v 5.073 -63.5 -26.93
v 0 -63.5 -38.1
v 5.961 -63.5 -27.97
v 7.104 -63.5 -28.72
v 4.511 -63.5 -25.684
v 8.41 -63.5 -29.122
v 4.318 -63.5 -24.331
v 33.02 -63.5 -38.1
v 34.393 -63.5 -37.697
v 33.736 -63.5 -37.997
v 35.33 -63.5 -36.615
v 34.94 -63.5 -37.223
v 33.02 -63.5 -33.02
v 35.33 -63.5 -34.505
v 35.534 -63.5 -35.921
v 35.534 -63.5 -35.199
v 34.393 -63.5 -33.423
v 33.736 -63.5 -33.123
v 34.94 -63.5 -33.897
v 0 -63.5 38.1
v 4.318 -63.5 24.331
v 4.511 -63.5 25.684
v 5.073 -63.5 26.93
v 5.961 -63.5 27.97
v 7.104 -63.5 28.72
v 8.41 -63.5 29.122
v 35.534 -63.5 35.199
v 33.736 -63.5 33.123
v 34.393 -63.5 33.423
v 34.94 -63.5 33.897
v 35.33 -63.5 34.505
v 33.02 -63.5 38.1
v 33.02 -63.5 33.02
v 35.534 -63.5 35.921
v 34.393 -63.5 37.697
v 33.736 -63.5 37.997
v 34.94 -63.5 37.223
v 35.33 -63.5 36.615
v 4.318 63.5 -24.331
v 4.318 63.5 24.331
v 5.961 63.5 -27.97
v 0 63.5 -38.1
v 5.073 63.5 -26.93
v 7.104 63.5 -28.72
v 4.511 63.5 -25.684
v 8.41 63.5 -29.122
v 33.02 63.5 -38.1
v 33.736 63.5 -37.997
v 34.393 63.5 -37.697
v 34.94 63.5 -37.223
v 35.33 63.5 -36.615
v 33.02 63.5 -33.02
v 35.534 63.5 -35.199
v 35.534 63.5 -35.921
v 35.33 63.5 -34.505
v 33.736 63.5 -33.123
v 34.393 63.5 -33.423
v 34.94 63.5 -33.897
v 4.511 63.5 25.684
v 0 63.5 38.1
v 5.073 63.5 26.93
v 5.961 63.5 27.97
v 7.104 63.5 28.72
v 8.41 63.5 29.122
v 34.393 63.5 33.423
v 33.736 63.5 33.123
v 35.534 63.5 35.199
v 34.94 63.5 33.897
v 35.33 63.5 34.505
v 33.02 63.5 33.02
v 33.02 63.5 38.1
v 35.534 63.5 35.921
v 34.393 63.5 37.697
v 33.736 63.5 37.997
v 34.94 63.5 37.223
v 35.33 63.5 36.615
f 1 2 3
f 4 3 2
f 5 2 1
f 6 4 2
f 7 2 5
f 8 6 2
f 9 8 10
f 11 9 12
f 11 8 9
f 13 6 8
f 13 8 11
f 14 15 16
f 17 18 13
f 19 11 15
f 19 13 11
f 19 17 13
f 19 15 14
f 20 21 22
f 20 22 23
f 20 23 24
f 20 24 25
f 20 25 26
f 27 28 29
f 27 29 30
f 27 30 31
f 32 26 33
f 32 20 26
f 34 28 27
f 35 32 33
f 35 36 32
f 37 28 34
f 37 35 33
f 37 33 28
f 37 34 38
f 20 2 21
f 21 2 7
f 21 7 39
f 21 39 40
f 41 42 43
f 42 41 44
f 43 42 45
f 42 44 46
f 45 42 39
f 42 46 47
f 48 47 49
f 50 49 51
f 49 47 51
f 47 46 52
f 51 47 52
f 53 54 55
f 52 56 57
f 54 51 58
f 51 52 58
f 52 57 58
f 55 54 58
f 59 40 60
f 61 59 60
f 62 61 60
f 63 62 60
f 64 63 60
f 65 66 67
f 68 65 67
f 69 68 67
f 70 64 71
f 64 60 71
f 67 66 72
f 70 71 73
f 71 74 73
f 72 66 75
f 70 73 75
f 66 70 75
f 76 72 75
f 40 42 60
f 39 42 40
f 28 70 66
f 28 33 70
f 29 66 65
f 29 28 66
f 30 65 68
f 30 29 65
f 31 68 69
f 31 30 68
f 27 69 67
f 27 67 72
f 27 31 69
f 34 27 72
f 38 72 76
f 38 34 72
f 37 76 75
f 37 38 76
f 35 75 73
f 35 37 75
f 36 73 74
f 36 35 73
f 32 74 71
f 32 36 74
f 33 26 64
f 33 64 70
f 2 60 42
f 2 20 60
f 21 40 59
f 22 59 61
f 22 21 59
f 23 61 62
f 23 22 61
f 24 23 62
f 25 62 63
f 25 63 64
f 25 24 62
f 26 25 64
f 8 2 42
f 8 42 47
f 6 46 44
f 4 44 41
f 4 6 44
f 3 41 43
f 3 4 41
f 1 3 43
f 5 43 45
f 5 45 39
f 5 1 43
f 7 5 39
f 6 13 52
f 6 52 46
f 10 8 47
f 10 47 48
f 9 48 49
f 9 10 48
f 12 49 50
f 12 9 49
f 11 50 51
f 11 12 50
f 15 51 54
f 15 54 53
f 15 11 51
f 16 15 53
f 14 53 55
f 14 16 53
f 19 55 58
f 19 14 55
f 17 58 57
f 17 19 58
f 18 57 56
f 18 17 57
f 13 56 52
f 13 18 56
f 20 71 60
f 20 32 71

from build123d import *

# Parameters (mm, degrees)
F1_DEPTH = 63.5


with BuildPart() as f1:
    # F0 (on Front) → F1 (new body, symmetric)
    with BuildSketch(Plane.XZ):
        with BuildLine():
            Line((0, 38.1), (0, 0))
            Line((0, 0), (0, -38.1))
            Line((0, -38.1), (33.02, -38.1))
            ThreePointArc((33.02, -38.1), (35.56, -35.56), (33.02, -33.02))
            Line((33.02, -33.02), (8.410474, -29.122234))
            ThreePointArc((8.410474, -29.122234), (5.480366, -27.481295), (4.318, -24.330563))
            Line((4.318, -24.330563), (4.318, 0))
            Line((4.318, 0), (4.318, 24.330563))
            ThreePointArc((4.318, 24.330563), (5.480366, 27.481295), (8.410474, 29.122234))
            Line((8.410474, 29.122234), (33.02, 33.02))
            ThreePointArc((33.02, 33.02), (35.56, 35.56), (33.02, 38.1))
            Line((33.02, 38.1), (0, 38.1))
        make_face()
    extrude(amount=F1_DEPTH, both=True)


solid = f1.part
